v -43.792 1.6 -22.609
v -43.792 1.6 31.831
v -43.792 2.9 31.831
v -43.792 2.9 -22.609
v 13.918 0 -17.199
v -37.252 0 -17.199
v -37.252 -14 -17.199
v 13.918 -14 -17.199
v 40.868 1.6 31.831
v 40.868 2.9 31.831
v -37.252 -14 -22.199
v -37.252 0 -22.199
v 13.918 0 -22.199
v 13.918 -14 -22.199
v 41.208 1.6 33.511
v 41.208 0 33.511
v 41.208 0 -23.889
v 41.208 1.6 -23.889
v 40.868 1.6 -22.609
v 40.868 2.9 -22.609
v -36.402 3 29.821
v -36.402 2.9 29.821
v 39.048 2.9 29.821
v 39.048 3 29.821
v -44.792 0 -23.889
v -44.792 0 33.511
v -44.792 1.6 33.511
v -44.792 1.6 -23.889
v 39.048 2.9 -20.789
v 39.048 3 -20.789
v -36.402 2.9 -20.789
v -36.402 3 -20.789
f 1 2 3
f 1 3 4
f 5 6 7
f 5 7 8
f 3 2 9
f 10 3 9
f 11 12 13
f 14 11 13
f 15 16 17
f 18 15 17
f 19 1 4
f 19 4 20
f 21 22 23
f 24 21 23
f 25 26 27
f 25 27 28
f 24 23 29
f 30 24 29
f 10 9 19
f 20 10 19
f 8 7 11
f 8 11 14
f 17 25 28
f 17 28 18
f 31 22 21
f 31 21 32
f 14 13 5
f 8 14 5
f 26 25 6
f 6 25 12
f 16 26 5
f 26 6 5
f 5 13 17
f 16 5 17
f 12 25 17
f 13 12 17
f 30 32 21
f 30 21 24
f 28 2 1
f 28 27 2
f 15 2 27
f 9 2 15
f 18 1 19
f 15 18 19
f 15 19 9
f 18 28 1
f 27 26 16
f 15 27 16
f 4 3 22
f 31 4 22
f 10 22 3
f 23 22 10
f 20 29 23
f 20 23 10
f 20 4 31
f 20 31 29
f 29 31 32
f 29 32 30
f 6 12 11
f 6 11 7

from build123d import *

# Parameters (mm, degrees)
SKETCH_1_W      = 86
SKETCH_1_H      = 57.4
EXTRUDE_1_DEPTH = 1.6
SKETCH_2_W      = 84.66
SKETCH_2_H      = 54.44
EXTRUDE_2_DEPTH = 1.3
SKETCH_3_W      = 75.45
SKETCH_3_H      = 50.61
EXTRUDE_3_DEPTH = 0.1
SKETCH_4_W      = 51.17
SKETCH_4_H      = 5
EXTRUDE_4_DEPTH = 14


with BuildPart() as part:
    # 草图1 → 凸台-拉伸1 (new body)
    with BuildSketch(Plane(origin=(0, 0, 0), x_dir=(1, 0, 0), z_dir=(0, 1, 0))):
        with Locations((-1.791666667, -4.811111111)):
            Rectangle(SKETCH_1_W, SKETCH_1_H)
    extrude(amount=EXTRUDE_1_DEPTH)

    # 草图2 → 凸台-拉伸2 (add)
    with BuildSketch(Plane(origin=(0, 1.6, 0), x_dir=(1, 0, 0), z_dir=(0, 1, 0))):
        with Locations((-1.461666667, -4.611111111)):
            Rectangle(SKETCH_2_W, SKETCH_2_H)
    extrude(amount=EXTRUDE_2_DEPTH)

    # 草图3 → 凸台-拉伸3 (add)
    with BuildSketch(Plane(origin=(0, 2.9, 0), x_dir=(1, 0, 0), z_dir=(0, 1, 0))):
        with Locations((1.323333333, -4.516111111)):
            Rectangle(SKETCH_3_W, SKETCH_3_H)
    extrude(amount=EXTRUDE_3_DEPTH)

    # 草图4 → 凸台-拉伸4 (add)
    with BuildSketch(Plane.XZ):
        with Locations((-11.666666667, -19.698888889)):
            Rectangle(SKETCH_4_W, SKETCH_4_H)
    extrude(amount=EXTRUDE_4_DEPTH)


solid = part.part
